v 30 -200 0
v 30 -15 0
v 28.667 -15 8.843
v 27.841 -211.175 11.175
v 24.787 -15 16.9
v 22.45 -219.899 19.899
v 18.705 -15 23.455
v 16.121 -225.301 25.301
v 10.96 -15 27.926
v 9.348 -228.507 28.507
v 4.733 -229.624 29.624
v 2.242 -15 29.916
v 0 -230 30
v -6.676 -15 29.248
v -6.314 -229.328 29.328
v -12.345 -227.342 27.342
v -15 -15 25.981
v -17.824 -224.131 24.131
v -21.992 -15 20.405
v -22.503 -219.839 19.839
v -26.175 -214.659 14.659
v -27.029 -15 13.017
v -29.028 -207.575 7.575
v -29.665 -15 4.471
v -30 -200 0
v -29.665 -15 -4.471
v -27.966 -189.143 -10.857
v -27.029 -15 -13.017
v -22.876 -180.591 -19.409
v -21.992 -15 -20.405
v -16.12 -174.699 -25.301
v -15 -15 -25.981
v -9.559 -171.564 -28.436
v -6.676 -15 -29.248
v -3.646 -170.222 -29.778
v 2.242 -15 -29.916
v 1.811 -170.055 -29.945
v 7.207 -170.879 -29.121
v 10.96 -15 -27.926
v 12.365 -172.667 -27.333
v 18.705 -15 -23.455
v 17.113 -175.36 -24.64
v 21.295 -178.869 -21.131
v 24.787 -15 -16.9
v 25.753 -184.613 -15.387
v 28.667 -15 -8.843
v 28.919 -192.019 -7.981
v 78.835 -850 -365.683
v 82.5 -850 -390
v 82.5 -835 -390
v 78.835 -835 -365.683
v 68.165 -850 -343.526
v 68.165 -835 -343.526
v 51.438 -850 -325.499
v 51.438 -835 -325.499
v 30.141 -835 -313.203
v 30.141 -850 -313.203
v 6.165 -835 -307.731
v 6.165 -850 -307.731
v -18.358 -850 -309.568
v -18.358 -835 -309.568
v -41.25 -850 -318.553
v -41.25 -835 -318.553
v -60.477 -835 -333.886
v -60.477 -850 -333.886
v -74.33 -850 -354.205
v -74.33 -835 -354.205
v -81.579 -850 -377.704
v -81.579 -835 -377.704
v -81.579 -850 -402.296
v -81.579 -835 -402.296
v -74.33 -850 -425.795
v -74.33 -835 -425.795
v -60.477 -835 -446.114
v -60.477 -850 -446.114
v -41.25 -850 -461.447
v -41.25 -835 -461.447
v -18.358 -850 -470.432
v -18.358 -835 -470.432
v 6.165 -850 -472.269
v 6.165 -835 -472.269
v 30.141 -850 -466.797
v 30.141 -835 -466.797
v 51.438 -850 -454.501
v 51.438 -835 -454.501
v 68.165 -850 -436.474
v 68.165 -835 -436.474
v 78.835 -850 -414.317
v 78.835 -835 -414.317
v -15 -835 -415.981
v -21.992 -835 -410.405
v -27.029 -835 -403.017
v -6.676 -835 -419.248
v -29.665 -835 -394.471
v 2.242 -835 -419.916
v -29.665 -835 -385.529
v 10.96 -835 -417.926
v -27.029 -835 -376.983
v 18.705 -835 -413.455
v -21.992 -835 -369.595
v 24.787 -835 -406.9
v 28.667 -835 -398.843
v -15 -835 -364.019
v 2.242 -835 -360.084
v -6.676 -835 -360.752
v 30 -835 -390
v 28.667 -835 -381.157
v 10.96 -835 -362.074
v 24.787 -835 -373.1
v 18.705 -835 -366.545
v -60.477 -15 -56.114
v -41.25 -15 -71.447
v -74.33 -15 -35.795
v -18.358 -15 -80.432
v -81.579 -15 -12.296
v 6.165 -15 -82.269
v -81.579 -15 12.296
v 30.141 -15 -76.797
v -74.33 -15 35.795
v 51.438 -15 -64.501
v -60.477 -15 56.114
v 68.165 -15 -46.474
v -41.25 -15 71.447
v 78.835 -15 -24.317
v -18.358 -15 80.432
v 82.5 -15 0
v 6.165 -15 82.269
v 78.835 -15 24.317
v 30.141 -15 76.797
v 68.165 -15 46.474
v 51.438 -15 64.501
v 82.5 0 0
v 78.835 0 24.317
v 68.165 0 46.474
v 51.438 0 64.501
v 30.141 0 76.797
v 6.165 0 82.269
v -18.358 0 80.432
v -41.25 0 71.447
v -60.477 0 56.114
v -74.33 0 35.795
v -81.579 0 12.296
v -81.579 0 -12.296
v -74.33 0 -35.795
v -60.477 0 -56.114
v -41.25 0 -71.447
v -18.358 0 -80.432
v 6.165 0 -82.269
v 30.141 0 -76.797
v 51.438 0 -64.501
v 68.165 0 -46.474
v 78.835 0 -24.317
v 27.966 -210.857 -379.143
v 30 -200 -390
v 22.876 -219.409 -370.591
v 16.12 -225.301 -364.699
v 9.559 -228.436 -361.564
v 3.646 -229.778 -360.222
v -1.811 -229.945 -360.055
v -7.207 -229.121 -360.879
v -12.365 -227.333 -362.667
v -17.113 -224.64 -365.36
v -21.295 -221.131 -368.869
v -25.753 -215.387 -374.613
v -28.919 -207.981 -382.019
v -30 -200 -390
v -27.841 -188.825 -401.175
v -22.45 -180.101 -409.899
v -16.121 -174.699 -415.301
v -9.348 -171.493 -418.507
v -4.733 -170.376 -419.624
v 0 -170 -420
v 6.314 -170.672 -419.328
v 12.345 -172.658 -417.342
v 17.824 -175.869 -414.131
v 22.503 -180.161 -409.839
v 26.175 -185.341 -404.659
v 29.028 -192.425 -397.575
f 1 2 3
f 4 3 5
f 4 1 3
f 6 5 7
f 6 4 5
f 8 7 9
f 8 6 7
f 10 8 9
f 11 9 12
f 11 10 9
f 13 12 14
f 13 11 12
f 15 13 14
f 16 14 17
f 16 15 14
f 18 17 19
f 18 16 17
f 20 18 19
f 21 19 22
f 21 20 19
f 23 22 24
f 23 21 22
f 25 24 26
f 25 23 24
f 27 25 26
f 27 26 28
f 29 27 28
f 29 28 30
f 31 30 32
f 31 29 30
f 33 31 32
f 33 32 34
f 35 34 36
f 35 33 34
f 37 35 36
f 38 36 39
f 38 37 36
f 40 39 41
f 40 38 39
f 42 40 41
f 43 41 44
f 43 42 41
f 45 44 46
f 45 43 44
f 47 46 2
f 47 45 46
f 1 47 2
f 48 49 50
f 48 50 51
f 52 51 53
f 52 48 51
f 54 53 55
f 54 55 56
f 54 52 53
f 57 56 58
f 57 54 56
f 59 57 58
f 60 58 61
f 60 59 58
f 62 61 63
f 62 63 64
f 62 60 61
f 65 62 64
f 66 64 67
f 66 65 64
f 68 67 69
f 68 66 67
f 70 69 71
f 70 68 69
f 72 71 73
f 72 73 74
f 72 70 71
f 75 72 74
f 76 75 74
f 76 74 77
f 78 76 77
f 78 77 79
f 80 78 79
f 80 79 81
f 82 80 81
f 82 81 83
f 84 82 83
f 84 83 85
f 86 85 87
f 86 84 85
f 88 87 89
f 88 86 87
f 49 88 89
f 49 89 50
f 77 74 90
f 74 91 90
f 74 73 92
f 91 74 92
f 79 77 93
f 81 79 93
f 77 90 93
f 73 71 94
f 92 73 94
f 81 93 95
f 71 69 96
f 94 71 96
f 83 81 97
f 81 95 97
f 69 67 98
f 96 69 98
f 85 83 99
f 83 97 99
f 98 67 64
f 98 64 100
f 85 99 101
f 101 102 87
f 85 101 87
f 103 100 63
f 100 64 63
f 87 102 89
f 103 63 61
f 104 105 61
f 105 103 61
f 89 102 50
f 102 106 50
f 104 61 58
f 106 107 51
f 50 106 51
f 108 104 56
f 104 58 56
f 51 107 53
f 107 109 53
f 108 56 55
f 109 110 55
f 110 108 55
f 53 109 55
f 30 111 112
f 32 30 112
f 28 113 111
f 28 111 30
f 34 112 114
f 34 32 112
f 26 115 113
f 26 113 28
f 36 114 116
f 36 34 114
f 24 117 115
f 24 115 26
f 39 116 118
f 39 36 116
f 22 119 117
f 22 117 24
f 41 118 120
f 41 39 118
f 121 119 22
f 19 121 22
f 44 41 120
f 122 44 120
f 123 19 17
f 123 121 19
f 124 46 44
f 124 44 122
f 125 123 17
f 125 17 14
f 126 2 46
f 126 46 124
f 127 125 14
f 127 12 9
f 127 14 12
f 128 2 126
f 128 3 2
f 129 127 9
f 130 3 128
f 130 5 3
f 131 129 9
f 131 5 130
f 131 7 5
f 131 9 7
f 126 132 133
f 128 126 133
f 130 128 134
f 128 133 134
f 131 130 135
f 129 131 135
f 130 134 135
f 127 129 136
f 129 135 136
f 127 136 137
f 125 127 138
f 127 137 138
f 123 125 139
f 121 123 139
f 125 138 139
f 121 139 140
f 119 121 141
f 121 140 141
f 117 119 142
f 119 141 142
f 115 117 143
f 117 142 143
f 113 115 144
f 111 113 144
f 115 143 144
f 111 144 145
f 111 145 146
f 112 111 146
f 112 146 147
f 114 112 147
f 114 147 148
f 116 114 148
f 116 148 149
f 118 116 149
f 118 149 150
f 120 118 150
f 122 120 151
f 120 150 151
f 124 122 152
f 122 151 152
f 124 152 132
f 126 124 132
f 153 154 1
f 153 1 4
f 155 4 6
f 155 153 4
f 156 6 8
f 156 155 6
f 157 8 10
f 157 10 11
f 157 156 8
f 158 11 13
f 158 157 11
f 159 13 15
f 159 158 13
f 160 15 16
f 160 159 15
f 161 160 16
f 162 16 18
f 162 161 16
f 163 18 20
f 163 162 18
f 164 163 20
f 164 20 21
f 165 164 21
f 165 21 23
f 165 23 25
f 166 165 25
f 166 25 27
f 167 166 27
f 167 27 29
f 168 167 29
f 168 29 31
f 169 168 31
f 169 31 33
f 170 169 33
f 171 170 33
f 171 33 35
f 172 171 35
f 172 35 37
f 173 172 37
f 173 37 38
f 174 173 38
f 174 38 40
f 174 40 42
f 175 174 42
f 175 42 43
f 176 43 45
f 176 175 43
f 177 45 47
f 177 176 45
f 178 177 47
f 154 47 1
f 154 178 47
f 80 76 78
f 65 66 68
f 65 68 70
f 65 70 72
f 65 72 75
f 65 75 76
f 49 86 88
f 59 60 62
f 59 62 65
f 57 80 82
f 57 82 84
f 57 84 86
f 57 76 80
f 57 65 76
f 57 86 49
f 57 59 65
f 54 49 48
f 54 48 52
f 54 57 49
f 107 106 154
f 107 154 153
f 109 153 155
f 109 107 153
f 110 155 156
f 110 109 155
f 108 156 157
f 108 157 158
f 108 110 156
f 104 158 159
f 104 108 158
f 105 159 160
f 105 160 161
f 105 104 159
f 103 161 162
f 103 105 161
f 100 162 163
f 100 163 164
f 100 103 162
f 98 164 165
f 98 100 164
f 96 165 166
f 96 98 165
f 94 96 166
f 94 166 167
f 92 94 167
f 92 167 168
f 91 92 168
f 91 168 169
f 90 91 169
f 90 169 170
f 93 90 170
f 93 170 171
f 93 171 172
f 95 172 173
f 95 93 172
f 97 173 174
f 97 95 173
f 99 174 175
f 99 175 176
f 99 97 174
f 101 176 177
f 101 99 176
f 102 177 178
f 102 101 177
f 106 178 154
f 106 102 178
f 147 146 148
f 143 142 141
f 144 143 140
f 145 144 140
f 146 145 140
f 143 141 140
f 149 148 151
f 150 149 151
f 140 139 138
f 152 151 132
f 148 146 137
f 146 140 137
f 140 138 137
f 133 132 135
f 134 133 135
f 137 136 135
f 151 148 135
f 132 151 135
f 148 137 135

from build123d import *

# Parameters (mm, degrees)
F0_R     = 30
F0_R_2   = 82.5
F3_DEPTH = 15
F4_R     = 82.5
F4_R_2   = 30
F5_DEPTH = 15


with BuildPart() as f2:
    # F2: sweep along a path in F1
    with BuildLine(Plane.YZ) as f2_path:
        Line((0, 0), (-200, 0))
        Line((-200, 0), (-200, -390))
        Line((-200, -390), (-850, -390))
    # F0 (on Front) → F2 (sweep)
    with BuildSketch(Plane.XZ):
        Circle(F0_R)
    sweep(path=f2_path.line, transition=Transition.RIGHT)

    # F0 (on Front) → F3 (join)
    with BuildSketch(Plane.XZ):
        Circle(F0_R_2)
        Circle(F0_R, mode=Mode.SUBTRACT)
    extrude(amount=F3_DEPTH)

    # F4 (on face) → F5 (join)
    with BuildSketch(Plane.XZ.offset(850)):
        with Locations((0, -390)):
            Circle(F4_R)
        with Locations((0, -390)):
            Circle(F4_R_2, mode=Mode.SUBTRACT)
    extrude(amount=-F5_DEPTH)


solid = f2.part
